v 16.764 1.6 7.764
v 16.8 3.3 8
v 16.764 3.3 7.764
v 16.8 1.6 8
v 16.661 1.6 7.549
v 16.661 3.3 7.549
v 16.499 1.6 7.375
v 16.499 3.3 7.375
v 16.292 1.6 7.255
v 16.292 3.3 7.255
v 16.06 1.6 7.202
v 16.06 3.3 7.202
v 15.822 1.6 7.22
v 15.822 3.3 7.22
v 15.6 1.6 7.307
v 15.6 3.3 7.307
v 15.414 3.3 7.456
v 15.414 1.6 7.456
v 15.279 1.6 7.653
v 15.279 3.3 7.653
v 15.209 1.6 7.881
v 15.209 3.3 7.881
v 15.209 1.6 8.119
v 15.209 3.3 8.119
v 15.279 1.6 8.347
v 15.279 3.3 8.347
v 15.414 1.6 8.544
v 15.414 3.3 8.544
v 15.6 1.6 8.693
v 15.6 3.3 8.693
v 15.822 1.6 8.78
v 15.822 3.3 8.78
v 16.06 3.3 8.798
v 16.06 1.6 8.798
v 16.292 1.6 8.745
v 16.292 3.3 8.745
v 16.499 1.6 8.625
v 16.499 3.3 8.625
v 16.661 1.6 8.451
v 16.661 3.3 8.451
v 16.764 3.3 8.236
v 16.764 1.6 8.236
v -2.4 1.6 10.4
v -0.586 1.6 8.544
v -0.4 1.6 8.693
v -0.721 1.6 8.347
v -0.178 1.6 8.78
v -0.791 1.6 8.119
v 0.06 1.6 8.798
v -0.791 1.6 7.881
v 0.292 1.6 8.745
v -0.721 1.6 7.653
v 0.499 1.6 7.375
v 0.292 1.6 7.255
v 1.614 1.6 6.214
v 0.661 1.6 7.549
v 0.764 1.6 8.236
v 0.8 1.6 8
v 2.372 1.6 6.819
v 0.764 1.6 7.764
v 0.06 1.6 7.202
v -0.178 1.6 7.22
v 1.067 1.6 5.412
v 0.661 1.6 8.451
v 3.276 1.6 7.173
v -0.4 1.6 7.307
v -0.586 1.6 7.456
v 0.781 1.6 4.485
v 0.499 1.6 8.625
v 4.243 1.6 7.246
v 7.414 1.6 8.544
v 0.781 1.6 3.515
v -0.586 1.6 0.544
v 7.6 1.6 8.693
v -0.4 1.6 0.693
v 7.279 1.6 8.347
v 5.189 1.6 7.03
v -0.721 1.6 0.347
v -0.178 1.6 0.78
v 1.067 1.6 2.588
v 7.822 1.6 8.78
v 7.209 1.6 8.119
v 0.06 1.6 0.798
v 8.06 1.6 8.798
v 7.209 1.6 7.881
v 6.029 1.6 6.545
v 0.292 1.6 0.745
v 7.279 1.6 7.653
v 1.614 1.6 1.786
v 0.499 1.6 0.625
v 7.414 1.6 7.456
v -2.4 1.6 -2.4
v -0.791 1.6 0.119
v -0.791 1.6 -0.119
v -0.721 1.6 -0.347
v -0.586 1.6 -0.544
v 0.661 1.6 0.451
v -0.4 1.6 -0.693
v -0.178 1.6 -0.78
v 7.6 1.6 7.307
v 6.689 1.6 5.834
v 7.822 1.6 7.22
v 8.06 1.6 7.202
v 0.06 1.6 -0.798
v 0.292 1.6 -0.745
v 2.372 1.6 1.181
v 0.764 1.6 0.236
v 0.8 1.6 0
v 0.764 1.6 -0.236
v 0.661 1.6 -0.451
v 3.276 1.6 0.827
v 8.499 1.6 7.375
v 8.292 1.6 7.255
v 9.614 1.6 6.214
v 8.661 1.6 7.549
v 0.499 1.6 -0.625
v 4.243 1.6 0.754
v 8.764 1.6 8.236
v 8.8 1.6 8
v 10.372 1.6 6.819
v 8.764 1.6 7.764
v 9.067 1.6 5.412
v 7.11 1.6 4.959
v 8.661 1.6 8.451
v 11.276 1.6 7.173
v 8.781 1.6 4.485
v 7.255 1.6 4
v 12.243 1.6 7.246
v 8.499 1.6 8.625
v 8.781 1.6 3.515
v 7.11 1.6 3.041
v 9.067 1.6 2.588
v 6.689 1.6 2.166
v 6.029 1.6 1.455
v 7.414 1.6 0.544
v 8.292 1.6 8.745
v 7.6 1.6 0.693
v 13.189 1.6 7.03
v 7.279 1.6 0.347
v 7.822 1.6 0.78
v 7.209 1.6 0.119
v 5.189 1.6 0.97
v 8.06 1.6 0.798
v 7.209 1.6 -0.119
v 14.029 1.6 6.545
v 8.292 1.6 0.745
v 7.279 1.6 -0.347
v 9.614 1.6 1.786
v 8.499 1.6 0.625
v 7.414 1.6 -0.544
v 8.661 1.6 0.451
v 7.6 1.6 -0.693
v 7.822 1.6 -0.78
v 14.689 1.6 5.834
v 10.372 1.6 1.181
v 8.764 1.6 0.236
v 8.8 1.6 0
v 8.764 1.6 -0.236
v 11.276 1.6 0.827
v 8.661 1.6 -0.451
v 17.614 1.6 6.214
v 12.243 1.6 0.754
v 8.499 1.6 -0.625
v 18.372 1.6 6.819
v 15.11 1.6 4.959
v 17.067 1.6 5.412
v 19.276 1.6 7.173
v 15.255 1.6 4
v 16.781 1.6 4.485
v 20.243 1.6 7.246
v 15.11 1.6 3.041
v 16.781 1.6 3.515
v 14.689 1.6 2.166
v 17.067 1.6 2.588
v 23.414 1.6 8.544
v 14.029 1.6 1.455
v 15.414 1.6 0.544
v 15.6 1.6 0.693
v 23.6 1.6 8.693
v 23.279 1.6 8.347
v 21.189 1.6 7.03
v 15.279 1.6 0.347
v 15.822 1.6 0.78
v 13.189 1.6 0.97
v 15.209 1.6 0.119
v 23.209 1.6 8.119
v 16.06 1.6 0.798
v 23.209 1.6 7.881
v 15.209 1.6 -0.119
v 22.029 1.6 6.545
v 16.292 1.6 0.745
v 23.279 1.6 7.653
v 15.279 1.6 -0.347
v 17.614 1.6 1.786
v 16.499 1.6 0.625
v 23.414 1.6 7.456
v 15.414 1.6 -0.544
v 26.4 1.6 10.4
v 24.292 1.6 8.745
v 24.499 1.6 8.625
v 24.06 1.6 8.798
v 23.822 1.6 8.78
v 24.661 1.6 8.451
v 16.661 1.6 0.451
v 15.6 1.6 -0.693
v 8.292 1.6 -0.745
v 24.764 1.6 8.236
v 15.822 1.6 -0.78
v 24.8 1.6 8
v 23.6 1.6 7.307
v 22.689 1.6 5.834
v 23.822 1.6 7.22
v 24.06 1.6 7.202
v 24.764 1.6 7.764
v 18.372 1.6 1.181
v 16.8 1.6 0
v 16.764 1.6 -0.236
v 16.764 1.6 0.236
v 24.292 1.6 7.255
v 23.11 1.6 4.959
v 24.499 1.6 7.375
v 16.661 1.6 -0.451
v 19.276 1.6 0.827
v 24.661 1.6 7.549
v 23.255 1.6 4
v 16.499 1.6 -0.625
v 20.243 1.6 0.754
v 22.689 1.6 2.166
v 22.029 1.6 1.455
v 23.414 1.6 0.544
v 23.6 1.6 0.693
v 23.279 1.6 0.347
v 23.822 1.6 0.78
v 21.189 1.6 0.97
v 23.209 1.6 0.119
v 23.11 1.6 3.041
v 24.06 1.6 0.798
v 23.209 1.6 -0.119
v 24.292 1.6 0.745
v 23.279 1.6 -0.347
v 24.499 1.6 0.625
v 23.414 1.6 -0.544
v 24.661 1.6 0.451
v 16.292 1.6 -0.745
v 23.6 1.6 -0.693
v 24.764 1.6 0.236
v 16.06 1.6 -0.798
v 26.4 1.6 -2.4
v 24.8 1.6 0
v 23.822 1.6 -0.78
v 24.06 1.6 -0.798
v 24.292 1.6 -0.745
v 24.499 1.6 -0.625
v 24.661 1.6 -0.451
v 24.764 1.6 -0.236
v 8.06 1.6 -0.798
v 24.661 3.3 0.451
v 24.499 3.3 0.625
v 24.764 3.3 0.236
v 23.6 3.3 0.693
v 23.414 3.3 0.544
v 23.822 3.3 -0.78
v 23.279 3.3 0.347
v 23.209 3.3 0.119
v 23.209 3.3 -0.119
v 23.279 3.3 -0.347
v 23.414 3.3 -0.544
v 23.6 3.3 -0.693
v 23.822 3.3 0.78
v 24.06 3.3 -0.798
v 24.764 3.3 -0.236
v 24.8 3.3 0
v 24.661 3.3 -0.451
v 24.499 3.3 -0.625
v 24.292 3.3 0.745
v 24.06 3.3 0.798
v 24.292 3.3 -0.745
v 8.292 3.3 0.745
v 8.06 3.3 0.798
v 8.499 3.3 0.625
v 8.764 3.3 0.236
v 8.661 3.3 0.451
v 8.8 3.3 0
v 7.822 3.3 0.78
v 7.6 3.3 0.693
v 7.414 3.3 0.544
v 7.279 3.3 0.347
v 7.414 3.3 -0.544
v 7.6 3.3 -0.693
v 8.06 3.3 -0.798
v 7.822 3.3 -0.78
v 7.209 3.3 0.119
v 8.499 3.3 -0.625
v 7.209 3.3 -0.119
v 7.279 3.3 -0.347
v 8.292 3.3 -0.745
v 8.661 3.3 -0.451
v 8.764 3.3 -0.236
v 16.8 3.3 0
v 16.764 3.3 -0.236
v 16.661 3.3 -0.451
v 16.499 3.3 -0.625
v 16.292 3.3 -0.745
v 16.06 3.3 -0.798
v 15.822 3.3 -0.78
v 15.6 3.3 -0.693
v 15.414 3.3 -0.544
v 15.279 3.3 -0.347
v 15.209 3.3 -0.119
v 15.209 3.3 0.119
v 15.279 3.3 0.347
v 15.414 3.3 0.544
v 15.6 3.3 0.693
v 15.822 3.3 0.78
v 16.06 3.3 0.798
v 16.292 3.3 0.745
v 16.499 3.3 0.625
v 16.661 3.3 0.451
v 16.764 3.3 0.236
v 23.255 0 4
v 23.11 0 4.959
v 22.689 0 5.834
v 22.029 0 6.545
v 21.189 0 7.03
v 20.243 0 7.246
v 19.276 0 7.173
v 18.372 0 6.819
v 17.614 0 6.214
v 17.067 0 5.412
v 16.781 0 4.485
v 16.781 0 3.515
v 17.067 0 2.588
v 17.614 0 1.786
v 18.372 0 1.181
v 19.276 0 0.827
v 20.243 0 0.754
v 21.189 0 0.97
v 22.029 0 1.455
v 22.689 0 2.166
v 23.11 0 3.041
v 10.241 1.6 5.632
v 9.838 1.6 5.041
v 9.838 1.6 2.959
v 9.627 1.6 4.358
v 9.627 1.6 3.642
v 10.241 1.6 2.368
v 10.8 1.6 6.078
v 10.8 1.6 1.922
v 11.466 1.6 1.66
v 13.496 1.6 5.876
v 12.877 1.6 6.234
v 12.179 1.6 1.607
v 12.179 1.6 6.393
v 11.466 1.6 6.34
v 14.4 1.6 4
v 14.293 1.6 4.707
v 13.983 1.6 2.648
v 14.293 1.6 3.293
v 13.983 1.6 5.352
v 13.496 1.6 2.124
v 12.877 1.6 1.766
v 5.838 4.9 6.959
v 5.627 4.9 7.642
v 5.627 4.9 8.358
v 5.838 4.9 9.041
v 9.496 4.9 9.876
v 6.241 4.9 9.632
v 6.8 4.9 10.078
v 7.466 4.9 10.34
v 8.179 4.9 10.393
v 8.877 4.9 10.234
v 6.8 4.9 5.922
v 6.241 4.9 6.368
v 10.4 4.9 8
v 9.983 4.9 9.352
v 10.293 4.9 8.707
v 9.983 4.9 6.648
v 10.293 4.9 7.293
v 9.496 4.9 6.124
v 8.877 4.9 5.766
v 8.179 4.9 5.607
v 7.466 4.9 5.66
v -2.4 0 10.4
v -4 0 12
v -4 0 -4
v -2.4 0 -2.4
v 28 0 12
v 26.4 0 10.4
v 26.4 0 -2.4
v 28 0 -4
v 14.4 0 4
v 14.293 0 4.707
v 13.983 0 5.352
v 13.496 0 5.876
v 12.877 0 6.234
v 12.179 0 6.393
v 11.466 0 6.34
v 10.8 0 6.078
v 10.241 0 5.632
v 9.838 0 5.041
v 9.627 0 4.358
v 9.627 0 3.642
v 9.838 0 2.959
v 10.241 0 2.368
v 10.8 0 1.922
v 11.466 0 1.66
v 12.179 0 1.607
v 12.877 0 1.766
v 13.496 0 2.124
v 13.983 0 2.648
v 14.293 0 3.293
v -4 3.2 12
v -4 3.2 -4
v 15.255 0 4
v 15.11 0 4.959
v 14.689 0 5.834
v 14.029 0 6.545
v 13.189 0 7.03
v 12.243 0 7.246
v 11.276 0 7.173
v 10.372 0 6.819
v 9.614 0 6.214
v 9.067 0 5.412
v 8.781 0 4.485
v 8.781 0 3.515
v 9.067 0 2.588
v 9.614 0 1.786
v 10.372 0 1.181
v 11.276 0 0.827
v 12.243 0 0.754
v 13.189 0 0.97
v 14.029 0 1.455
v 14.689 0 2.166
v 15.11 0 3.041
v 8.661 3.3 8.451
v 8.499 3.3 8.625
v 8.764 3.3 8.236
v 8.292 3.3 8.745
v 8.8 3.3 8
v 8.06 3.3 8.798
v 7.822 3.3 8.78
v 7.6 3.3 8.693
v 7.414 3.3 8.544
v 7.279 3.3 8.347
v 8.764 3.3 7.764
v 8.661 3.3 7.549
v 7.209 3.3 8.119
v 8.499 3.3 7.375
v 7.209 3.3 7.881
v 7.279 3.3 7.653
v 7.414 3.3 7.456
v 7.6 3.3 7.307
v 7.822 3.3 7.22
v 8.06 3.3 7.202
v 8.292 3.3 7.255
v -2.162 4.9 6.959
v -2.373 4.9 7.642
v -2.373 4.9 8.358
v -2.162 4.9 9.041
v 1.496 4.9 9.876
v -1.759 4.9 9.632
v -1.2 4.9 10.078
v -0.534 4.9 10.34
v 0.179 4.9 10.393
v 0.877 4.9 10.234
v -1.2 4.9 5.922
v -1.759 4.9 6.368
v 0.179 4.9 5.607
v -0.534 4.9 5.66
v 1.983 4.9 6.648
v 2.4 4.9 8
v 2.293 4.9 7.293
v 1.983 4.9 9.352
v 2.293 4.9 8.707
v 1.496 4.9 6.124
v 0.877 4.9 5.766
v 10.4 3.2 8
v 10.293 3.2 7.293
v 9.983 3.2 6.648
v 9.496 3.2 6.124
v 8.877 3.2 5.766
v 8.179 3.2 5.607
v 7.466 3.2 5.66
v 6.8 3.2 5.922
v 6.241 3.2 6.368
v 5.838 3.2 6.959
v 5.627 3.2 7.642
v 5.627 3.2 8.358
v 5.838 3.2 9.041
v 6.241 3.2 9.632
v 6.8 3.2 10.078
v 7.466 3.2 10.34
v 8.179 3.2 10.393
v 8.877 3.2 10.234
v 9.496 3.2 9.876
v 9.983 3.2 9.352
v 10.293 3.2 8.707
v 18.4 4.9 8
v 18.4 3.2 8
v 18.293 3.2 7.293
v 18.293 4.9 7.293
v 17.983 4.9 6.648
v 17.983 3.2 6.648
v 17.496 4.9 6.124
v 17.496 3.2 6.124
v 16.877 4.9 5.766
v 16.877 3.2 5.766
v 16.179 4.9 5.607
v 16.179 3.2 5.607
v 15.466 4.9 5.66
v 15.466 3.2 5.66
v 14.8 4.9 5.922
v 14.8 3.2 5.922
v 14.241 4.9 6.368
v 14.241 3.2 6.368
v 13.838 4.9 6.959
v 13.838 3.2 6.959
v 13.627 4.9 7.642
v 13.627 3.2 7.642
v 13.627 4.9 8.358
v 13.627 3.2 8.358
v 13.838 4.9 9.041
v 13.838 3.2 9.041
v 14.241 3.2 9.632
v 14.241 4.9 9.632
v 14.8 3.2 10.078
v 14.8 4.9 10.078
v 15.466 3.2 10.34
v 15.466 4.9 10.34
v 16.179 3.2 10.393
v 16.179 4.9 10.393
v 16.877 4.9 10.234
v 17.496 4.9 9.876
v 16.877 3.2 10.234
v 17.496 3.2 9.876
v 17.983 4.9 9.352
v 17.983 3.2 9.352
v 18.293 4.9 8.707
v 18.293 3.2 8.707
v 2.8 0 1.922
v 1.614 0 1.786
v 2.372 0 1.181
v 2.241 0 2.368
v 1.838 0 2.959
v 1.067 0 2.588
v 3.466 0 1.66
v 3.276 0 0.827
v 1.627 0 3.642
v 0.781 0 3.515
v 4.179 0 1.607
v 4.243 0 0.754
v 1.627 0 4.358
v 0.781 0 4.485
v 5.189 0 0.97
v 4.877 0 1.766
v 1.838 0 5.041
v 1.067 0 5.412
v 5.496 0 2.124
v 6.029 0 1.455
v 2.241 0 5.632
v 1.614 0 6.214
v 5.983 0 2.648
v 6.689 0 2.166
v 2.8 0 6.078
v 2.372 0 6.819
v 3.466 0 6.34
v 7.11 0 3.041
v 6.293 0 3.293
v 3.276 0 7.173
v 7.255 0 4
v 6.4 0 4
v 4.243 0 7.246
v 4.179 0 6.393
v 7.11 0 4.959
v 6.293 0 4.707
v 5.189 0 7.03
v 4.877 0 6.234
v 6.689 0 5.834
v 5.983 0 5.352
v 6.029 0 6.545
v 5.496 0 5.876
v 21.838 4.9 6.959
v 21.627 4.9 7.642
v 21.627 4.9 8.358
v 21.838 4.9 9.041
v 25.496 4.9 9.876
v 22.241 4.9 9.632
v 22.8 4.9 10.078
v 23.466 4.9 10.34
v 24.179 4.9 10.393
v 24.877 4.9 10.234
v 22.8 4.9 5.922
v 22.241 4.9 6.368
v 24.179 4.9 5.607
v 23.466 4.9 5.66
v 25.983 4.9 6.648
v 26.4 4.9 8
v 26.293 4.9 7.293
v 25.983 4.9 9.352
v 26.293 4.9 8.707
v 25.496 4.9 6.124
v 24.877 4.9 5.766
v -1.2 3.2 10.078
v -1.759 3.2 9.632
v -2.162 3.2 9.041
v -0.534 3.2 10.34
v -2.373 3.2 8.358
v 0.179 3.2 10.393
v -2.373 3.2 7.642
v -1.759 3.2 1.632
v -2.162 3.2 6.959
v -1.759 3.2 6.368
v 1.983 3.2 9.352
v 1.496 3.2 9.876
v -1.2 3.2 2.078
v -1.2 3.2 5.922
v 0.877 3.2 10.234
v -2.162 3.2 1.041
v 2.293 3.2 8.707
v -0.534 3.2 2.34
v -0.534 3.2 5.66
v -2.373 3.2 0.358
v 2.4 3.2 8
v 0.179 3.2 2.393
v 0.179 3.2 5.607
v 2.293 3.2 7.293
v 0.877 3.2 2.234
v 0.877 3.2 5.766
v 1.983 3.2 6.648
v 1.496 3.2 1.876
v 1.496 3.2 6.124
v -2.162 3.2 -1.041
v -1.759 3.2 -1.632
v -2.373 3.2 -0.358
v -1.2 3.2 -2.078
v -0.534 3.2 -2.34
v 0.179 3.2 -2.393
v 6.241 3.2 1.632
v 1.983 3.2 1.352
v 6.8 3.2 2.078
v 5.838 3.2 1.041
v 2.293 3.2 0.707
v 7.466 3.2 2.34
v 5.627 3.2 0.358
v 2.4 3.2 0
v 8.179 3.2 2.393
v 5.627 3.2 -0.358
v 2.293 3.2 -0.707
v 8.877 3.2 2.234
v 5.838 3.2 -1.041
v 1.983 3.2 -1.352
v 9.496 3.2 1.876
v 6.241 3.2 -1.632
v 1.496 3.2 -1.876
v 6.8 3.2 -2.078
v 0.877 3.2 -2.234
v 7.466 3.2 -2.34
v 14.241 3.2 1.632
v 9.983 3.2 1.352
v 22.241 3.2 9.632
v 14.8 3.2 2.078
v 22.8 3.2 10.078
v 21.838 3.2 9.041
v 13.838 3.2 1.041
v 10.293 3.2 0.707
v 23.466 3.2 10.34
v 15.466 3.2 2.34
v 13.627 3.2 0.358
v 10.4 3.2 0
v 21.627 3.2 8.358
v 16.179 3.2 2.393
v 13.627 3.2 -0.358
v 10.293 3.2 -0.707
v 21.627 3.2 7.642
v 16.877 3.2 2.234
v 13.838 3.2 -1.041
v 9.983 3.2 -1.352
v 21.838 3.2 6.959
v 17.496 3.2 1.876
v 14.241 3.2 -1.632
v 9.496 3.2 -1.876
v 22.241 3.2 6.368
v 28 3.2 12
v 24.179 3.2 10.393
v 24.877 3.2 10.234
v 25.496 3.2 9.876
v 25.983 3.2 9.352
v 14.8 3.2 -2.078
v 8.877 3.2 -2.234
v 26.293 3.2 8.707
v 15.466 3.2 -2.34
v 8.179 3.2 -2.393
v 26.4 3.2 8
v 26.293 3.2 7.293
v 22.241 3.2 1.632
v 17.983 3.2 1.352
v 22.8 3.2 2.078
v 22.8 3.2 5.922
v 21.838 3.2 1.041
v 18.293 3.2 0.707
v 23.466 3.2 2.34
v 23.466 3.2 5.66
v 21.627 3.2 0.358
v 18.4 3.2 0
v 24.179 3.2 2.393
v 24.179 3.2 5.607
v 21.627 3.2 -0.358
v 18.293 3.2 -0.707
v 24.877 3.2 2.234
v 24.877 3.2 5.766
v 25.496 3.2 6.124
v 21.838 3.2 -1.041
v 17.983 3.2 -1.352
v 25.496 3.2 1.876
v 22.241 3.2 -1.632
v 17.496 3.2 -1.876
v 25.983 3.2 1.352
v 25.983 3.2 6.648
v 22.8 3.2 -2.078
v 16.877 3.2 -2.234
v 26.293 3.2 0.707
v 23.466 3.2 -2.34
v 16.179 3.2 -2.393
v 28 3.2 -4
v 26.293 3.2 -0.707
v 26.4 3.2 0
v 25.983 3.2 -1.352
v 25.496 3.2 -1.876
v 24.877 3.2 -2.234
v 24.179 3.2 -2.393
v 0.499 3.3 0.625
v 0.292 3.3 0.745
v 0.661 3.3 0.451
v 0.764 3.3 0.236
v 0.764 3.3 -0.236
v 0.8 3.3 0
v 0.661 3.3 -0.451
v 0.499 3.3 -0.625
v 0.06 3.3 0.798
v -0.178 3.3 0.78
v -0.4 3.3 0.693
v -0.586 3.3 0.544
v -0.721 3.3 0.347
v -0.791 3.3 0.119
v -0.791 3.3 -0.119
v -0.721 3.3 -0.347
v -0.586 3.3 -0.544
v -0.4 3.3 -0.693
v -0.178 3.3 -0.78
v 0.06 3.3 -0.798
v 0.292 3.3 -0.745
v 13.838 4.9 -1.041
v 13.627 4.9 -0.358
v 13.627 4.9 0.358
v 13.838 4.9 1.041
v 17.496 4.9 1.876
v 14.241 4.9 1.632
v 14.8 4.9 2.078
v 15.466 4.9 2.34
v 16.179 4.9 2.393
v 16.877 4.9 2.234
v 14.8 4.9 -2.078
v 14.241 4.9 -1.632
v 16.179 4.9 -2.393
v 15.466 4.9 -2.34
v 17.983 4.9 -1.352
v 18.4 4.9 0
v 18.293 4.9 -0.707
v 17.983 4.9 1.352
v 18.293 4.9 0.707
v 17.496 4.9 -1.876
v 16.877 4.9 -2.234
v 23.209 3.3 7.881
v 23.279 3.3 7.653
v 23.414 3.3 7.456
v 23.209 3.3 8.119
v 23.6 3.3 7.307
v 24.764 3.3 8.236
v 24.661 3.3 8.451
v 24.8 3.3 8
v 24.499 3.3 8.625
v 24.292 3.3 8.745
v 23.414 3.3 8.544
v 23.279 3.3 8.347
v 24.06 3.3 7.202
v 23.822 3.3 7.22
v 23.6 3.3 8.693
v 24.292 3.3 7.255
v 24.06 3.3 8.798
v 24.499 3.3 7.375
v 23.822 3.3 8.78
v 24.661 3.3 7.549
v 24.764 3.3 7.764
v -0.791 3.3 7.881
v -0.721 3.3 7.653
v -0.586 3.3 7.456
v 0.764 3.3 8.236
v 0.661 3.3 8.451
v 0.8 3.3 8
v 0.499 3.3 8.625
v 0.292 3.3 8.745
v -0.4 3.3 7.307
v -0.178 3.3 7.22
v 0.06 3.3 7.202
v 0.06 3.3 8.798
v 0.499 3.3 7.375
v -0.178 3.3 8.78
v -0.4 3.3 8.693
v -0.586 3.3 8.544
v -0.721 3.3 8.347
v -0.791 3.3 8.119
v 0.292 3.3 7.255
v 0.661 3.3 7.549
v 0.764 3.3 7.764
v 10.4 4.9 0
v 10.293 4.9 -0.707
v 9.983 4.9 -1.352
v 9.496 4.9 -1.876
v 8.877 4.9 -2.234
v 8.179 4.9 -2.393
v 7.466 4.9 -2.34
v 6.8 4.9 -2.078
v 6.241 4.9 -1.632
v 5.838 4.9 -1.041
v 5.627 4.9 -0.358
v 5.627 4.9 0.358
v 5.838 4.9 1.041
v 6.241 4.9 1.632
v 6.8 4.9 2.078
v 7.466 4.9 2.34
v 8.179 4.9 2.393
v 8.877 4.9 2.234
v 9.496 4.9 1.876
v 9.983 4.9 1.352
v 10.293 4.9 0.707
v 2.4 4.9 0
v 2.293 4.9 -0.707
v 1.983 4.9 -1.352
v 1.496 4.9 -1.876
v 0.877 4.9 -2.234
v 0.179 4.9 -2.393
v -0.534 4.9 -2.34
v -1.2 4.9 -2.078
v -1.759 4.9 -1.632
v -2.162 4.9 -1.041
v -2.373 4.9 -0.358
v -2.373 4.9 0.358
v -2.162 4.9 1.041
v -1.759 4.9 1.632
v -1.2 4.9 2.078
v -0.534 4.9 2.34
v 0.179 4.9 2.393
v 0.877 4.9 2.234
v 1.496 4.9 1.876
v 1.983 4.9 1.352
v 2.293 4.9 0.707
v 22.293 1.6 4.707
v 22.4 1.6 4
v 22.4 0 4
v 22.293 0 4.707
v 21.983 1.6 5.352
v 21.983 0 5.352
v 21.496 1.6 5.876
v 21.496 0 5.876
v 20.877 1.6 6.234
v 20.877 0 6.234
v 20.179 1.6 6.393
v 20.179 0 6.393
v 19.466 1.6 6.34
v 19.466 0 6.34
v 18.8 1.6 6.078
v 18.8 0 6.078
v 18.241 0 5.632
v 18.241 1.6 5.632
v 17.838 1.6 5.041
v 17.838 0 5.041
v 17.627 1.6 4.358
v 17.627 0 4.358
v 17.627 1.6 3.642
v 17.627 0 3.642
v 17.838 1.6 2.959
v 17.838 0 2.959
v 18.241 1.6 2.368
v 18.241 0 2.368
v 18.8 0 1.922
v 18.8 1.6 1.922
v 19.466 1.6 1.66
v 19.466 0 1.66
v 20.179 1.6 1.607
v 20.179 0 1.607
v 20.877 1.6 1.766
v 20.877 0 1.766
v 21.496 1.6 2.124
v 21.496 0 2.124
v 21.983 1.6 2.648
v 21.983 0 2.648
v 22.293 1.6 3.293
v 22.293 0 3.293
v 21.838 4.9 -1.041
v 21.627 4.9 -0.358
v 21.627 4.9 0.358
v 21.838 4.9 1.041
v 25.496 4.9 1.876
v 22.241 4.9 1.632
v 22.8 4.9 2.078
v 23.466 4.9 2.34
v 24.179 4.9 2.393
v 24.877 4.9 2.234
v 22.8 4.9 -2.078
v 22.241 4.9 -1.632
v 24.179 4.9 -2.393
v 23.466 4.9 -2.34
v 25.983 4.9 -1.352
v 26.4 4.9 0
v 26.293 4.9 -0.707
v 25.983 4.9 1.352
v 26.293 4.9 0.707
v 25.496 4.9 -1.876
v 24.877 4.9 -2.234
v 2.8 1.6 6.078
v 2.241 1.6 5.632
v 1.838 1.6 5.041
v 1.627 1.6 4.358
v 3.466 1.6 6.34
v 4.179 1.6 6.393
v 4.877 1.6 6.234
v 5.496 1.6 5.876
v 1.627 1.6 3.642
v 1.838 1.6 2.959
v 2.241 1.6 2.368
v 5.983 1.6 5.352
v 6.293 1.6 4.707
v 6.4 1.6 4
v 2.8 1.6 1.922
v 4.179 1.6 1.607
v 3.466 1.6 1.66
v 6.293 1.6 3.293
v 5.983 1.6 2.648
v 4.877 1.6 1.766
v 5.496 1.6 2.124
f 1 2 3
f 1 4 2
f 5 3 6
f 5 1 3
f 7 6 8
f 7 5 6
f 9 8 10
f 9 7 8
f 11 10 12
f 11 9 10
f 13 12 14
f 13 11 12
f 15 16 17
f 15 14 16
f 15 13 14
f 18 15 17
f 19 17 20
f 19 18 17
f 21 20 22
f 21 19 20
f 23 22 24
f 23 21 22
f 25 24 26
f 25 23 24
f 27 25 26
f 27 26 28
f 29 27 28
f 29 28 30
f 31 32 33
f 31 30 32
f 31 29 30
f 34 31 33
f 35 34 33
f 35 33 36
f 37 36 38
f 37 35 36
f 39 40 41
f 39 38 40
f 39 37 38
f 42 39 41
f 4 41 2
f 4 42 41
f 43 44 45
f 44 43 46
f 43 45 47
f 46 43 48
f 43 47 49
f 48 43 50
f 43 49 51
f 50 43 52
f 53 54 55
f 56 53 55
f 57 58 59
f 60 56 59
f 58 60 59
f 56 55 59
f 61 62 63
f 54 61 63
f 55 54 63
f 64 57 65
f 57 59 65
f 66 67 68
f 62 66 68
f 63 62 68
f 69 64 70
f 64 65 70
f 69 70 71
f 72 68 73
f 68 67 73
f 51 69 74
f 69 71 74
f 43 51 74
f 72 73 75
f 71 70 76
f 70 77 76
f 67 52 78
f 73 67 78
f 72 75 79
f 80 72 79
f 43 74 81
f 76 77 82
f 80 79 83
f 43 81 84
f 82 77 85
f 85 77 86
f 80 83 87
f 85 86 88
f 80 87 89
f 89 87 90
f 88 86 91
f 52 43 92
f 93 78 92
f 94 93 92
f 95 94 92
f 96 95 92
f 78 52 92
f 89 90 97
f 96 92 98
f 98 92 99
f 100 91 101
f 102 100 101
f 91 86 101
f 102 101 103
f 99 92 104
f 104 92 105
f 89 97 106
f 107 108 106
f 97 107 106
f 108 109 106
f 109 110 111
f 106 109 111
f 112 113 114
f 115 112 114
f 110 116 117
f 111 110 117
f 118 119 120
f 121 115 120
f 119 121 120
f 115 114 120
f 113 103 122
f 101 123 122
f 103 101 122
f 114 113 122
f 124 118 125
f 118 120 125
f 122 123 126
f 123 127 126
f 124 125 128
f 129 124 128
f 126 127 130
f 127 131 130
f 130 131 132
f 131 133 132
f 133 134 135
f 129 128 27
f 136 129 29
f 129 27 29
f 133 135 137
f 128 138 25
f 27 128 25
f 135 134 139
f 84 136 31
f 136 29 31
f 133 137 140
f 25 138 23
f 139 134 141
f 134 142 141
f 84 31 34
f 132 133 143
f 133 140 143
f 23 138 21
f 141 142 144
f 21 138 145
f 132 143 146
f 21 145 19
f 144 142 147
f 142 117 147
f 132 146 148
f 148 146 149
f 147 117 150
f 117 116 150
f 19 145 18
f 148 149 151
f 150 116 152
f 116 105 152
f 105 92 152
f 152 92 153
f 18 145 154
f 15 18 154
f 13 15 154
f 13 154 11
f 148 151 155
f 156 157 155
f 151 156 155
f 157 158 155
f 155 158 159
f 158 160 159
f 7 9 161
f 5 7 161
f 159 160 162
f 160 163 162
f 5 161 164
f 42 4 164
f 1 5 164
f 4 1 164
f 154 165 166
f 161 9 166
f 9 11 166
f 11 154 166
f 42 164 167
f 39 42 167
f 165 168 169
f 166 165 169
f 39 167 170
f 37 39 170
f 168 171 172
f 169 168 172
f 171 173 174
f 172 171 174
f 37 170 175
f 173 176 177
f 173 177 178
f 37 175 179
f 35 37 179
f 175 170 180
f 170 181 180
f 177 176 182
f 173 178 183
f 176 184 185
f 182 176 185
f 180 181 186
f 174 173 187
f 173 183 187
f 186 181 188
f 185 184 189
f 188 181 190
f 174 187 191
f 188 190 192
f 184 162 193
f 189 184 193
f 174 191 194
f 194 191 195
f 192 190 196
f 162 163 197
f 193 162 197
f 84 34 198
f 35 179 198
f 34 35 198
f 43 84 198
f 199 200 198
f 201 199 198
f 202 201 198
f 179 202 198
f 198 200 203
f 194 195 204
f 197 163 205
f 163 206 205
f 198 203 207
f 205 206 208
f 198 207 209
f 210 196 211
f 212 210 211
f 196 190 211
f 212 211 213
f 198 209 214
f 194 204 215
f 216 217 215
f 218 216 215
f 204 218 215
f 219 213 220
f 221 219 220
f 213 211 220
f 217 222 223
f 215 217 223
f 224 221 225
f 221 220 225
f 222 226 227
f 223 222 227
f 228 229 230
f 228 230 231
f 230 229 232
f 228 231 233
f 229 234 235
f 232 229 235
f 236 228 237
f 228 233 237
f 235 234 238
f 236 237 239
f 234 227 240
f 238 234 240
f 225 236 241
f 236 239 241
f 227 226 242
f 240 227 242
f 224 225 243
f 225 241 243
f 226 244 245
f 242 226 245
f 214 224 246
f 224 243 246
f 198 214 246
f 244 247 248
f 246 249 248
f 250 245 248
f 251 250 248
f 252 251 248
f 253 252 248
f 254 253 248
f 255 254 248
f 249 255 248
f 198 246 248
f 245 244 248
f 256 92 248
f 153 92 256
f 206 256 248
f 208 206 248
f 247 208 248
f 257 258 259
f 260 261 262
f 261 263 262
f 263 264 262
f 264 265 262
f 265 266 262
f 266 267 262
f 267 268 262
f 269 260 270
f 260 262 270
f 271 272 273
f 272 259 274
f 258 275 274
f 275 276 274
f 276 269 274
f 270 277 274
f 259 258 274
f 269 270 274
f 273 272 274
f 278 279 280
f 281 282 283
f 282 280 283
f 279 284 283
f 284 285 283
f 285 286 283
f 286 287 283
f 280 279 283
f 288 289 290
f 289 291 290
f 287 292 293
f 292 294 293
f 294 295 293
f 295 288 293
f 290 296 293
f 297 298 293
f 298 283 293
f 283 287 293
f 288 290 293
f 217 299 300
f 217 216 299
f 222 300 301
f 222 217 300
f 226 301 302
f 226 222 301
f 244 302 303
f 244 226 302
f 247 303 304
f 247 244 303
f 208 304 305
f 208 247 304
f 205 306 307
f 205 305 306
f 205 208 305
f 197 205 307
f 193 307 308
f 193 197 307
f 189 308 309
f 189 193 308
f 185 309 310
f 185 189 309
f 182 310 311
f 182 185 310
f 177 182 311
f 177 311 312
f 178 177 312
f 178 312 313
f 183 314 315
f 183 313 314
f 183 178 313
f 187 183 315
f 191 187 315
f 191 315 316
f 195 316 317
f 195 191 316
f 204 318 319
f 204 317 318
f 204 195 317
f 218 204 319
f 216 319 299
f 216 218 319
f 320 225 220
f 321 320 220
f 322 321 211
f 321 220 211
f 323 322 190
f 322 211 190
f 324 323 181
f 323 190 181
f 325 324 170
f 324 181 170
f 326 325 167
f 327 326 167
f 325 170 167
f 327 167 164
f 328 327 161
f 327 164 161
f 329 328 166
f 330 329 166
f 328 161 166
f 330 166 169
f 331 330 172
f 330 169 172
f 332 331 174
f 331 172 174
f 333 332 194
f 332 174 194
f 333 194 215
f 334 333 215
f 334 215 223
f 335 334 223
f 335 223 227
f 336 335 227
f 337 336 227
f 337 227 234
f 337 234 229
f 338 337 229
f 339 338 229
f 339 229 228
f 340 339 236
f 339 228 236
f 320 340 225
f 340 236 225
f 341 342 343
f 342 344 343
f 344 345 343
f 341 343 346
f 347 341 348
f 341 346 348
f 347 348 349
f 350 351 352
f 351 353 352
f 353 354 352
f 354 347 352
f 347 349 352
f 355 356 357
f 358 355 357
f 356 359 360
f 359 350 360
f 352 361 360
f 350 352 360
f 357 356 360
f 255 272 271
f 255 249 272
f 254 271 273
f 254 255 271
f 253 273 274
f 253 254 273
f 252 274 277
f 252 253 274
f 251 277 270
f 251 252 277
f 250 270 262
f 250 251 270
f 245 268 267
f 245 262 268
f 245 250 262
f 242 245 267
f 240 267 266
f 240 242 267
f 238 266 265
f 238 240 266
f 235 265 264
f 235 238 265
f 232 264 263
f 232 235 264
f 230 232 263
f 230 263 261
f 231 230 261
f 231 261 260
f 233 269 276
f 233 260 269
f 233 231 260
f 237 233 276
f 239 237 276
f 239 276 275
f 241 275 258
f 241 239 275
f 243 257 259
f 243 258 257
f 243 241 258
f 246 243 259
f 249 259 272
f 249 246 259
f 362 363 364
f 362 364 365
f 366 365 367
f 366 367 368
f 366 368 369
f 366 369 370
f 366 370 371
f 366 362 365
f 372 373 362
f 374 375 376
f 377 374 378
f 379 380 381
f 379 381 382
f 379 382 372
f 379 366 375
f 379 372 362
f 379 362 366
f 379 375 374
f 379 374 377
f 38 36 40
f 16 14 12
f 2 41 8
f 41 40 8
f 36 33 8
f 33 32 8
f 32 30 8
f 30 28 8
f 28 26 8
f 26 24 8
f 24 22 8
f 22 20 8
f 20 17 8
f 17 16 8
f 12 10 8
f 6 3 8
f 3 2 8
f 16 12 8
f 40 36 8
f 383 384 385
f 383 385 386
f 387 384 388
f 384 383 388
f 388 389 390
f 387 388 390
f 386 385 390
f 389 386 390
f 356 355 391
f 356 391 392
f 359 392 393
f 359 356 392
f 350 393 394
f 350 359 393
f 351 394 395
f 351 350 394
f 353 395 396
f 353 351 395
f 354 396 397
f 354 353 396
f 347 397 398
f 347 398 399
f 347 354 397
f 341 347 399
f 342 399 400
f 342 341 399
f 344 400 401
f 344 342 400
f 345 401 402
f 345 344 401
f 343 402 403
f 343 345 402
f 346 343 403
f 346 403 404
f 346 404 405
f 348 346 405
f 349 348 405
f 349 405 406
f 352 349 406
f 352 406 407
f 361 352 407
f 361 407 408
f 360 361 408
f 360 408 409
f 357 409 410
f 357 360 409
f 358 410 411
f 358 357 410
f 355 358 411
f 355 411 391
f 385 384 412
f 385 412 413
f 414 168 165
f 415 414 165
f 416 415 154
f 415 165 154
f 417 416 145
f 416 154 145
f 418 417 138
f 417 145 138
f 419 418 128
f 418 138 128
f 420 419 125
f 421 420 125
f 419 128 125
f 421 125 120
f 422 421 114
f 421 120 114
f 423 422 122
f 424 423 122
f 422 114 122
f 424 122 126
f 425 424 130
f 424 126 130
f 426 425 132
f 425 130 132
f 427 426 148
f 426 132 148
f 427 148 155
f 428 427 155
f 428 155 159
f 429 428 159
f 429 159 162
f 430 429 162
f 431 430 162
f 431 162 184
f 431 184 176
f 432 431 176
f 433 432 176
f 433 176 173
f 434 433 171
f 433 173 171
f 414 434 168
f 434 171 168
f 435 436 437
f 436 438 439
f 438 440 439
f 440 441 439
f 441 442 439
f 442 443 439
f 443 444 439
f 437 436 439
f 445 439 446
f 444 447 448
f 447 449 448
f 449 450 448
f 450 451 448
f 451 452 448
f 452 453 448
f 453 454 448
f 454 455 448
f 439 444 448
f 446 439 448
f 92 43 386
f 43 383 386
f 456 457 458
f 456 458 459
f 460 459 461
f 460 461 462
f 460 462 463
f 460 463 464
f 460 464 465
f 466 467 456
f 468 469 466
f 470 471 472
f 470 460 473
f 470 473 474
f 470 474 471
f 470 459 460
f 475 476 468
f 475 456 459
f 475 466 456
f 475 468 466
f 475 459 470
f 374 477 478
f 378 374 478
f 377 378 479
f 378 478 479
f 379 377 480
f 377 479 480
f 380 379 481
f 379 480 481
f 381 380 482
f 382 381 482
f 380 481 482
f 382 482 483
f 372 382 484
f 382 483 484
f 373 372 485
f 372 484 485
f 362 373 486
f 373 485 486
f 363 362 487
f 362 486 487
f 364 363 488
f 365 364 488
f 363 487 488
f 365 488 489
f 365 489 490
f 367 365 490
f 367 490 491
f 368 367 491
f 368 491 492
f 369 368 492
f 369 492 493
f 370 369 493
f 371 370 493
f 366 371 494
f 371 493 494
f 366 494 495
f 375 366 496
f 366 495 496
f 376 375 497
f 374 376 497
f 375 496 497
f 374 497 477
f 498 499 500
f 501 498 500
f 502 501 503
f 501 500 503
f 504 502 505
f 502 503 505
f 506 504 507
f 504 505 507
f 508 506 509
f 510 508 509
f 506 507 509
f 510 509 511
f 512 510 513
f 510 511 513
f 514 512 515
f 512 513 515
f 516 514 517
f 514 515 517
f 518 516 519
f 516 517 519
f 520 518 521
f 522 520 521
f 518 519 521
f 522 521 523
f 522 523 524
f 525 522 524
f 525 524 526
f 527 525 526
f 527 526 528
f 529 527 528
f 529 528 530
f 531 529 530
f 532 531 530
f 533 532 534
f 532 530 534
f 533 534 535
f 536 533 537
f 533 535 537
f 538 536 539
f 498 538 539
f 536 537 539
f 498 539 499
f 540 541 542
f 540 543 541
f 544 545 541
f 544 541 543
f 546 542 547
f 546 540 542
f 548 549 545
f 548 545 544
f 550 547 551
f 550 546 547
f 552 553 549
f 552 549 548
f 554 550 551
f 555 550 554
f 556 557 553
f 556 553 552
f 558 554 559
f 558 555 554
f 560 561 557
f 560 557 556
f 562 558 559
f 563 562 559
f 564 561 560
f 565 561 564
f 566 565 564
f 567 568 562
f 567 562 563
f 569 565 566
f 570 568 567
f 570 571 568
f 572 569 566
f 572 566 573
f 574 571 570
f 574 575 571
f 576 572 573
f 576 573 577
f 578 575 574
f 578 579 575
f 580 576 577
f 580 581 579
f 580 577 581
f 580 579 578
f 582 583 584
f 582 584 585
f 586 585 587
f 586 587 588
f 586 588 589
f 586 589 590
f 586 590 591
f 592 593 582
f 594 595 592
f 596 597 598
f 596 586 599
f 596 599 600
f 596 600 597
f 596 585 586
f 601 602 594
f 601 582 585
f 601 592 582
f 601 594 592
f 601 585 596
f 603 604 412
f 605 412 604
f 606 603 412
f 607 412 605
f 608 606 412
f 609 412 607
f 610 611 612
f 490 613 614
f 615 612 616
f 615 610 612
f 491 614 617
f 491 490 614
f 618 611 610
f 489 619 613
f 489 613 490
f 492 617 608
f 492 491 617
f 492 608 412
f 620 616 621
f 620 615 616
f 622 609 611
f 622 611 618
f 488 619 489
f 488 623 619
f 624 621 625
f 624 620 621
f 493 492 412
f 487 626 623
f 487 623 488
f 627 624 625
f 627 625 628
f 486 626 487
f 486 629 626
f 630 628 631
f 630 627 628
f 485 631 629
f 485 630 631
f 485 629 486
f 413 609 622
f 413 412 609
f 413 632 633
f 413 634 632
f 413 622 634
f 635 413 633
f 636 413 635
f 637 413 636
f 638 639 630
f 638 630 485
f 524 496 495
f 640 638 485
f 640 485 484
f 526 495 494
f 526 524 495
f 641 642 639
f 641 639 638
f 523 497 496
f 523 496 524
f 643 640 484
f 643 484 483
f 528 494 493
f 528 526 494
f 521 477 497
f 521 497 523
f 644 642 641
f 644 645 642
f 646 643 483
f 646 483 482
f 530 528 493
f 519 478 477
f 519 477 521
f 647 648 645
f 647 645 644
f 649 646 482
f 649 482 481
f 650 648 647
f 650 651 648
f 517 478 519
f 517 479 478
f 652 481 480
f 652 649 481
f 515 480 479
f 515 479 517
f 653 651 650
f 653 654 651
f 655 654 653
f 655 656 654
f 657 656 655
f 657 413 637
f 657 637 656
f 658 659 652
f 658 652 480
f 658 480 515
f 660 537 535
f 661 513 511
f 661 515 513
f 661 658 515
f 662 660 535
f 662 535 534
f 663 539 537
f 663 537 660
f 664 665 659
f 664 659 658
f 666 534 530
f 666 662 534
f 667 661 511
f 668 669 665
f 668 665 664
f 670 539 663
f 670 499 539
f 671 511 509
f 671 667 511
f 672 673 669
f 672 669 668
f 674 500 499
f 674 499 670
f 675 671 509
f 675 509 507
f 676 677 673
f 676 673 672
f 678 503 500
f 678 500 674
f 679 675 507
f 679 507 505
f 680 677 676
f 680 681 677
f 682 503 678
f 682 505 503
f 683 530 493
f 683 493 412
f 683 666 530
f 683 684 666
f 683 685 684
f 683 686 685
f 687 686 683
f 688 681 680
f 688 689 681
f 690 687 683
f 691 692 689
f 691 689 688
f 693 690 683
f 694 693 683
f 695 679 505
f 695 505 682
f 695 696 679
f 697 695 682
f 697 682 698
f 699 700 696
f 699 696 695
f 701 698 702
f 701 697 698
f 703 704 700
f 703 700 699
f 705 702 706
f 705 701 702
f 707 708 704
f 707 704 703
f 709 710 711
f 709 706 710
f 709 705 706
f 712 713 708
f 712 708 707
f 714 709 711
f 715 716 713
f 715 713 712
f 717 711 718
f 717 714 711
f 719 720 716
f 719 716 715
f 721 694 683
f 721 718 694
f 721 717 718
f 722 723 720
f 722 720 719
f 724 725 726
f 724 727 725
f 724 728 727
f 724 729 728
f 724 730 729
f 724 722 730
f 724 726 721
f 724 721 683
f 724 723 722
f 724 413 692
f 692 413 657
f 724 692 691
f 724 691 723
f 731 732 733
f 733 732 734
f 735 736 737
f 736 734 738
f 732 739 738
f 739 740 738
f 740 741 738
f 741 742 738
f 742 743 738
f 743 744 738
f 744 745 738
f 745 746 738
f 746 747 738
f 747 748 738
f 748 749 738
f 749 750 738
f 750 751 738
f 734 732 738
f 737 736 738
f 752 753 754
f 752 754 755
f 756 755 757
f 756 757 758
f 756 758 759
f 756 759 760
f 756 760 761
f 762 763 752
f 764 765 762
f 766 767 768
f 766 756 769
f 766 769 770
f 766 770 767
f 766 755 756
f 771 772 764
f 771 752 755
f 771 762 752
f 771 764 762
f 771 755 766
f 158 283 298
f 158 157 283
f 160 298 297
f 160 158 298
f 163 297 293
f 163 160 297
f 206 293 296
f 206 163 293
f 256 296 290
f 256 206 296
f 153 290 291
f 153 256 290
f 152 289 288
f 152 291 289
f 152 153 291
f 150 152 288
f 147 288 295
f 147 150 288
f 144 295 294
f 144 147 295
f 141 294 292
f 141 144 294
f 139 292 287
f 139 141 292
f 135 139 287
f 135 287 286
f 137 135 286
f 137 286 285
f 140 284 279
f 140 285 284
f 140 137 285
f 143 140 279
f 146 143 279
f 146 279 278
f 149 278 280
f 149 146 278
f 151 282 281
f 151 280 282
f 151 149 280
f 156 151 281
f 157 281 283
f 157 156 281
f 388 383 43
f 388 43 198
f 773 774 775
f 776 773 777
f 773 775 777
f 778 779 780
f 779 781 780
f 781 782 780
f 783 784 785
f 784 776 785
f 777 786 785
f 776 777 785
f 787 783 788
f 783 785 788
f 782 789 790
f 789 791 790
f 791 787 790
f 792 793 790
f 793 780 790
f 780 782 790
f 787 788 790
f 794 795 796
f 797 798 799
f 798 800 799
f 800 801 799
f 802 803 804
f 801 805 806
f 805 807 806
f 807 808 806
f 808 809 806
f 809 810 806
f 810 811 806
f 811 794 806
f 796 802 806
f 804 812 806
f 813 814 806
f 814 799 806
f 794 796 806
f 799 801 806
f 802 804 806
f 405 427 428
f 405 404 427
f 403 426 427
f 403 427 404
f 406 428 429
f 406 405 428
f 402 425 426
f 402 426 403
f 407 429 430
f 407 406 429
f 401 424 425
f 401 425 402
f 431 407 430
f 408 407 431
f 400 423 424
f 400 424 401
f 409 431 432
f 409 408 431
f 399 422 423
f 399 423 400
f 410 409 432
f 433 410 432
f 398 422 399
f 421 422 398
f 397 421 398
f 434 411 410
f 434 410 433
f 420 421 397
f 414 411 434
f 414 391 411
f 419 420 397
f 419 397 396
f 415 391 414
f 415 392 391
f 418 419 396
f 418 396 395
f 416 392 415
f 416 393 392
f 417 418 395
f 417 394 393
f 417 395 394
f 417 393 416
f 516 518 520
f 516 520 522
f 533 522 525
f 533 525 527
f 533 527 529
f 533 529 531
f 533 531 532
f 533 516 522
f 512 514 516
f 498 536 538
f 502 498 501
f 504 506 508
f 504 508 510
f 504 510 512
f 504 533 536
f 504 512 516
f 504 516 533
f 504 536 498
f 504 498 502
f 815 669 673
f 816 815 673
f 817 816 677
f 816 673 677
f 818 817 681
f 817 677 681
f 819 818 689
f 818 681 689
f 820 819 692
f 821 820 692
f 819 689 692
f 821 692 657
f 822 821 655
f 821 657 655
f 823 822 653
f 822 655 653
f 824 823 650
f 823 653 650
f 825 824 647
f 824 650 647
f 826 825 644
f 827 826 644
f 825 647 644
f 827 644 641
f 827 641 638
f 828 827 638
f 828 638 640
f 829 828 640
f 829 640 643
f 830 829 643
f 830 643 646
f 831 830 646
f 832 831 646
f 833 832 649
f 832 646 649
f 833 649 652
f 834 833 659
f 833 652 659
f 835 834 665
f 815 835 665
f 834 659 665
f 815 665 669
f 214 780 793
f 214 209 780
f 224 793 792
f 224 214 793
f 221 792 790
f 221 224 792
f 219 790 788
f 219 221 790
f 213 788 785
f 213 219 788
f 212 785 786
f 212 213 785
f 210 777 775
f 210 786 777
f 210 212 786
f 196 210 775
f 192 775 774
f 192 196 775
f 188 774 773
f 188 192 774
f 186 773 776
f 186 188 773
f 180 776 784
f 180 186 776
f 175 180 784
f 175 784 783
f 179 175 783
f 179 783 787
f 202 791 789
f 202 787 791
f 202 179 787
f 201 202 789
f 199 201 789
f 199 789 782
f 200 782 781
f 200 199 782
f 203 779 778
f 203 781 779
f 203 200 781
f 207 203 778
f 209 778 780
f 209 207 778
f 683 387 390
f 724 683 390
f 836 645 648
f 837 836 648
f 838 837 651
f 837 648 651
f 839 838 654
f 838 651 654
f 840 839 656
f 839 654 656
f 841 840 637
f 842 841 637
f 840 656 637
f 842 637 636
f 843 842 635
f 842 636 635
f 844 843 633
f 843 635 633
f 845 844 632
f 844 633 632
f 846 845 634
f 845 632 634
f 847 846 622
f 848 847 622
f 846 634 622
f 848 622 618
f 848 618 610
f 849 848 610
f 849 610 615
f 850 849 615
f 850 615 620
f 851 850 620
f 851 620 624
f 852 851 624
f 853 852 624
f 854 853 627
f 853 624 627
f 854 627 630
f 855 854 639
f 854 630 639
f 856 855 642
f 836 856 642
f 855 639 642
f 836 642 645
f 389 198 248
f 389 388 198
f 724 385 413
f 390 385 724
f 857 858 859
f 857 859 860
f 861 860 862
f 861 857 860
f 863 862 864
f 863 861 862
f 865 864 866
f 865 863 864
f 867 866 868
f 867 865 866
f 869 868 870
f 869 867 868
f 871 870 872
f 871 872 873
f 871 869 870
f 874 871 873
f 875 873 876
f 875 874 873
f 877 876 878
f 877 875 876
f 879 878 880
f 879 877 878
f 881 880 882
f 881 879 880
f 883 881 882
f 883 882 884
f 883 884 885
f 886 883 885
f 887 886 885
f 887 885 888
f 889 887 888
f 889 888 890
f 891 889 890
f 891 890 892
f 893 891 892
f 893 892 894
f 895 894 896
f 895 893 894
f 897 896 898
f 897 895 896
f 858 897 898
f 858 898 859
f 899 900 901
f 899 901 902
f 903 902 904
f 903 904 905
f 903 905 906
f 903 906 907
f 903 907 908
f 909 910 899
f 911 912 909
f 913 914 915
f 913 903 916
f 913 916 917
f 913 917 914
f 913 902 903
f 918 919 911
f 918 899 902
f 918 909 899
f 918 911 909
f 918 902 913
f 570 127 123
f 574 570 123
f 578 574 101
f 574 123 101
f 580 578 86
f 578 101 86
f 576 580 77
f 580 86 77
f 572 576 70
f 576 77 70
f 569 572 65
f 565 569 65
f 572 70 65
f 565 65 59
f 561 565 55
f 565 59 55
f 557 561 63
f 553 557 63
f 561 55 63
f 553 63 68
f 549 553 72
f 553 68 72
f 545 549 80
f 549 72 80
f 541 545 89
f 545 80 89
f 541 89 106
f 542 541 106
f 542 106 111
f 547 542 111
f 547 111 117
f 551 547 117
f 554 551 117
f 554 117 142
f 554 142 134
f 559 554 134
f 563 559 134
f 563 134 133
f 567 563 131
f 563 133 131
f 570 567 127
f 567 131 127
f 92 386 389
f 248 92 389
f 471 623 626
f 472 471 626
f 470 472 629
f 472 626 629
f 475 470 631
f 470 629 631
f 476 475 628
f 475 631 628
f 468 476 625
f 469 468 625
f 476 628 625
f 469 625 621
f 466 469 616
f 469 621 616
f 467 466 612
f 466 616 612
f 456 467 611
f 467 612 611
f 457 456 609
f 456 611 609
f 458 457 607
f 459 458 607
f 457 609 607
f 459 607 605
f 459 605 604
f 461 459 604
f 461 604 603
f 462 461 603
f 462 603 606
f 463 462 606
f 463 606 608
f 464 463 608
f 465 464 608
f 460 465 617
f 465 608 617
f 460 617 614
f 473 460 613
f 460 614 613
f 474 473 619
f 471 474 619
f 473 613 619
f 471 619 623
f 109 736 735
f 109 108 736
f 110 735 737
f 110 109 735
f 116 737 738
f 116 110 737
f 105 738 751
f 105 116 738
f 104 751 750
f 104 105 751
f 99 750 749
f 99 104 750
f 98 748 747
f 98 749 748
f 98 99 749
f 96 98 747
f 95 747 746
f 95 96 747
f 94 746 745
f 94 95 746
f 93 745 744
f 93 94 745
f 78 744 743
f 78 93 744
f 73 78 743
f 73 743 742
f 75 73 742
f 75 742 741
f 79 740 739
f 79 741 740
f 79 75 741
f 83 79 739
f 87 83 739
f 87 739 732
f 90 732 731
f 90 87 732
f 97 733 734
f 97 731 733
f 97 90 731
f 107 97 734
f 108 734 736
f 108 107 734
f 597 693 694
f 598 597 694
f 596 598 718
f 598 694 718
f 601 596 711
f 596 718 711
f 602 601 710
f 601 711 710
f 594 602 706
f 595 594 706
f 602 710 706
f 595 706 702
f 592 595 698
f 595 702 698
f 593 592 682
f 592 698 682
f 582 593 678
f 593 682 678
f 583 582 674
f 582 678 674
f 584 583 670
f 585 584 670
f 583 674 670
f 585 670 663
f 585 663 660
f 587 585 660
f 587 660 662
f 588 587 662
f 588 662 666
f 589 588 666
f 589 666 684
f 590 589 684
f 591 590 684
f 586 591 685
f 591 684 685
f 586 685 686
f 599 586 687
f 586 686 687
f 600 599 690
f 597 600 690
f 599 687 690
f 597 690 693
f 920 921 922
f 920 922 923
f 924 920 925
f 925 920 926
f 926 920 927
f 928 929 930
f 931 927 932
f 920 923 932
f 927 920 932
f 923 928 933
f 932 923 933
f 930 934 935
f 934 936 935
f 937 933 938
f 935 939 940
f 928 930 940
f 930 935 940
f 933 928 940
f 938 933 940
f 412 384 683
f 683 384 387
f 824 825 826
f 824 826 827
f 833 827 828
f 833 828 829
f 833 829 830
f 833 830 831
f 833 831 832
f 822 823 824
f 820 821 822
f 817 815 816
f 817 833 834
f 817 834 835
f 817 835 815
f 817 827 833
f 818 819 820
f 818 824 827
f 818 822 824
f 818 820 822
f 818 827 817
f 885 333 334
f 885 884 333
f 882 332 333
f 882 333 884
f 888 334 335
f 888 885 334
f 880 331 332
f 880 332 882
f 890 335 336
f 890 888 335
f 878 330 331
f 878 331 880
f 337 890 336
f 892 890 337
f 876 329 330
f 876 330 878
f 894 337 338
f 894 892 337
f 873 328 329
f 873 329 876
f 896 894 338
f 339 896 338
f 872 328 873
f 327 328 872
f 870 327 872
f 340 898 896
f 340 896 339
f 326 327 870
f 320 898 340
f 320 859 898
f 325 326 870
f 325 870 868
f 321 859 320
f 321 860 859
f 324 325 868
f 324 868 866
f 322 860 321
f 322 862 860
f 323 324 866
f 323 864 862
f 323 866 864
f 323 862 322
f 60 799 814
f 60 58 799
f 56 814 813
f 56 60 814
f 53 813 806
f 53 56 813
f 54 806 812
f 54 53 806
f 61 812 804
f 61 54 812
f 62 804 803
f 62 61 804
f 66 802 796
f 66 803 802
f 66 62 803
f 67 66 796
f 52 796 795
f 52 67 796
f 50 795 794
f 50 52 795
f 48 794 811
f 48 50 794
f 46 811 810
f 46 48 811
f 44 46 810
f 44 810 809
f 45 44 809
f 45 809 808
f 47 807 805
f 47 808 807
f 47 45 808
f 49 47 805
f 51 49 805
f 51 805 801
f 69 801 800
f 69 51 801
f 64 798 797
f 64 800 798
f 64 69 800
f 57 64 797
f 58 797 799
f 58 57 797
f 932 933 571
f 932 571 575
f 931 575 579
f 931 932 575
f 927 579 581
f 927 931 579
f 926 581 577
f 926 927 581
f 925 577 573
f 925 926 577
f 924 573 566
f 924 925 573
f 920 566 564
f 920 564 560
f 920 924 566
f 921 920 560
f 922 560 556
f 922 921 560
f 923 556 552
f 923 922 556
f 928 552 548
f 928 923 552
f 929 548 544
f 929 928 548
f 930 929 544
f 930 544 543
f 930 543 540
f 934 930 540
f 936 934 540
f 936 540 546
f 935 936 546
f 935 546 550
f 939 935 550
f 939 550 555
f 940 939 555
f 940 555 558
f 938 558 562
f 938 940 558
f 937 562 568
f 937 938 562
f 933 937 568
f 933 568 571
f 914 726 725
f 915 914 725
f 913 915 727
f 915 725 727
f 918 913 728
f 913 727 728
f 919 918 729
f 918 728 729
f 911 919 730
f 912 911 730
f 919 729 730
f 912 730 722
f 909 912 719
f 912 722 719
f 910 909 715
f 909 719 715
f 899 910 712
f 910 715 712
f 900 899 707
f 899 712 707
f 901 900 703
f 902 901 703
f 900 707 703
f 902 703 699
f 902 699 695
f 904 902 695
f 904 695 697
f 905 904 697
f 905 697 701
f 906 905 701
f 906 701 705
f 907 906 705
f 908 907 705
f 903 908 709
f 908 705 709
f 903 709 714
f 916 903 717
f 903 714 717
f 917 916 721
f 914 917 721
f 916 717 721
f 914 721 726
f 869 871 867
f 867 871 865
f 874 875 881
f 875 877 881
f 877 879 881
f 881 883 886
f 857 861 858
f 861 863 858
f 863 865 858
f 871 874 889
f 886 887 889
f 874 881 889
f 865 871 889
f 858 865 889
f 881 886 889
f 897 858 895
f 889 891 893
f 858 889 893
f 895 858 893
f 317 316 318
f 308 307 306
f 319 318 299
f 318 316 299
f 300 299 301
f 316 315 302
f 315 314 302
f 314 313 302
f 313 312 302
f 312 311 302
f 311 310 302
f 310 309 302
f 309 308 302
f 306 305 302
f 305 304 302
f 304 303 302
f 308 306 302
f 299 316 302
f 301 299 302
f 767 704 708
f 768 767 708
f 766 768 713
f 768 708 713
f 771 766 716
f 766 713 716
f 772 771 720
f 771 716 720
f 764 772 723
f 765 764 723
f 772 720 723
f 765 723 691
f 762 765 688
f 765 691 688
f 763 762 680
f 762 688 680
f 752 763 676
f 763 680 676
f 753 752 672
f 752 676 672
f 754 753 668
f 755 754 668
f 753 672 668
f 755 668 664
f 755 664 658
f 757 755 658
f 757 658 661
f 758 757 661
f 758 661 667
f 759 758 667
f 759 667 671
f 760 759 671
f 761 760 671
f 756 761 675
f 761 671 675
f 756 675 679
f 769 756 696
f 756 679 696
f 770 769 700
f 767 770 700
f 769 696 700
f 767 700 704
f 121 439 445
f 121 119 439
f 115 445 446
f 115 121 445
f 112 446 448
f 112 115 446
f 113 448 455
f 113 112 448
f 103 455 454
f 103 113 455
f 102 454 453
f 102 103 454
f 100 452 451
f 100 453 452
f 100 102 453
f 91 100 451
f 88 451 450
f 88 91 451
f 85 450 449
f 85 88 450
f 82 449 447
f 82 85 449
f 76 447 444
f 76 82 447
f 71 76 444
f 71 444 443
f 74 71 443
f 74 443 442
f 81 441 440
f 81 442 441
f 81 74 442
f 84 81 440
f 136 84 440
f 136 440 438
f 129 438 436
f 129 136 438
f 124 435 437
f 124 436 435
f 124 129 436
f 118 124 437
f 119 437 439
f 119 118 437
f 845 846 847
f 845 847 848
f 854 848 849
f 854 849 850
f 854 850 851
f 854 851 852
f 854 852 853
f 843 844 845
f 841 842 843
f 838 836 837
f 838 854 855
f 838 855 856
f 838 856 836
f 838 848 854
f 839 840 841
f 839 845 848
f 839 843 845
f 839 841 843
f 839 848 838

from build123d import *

# Parameters (mm, degrees)
SKETCH_1_W                       = 8
SKETCH_1_H                       = 8
HEIGHT_DEPTH                     = 3.2
SKETCH_2_R                       = 2.4
EXTRUDE_2_DEPTH                  = 1.7
PATTERN_LINEAR_1_COUNT           = 2
PATTERN_LINEAR_1_PITCH           = 8
PATTERN_LINEAR_2_COUNT           = 4
PATTERN_LINEAR_2_PITCH           = 8
PATTERN_LINEAR_2_COPY_1_SKETCH_W = 8
PATTERN_LINEAR_2_COPY_1_SKETCH_H = 8
PATTERN_LINEAR_2_COPY_1_DEPTH    = 3.2
PATTERN_LINEAR_2_COPY_2_SKETCH_W = 8
PATTERN_LINEAR_2_COPY_2_SKETCH_H = 8
PATTERN_LINEAR_2_COPY_2_DEPTH    = 3.2
PATTERN_LINEAR_2_COPY_3_SKETCH_W = 8
PATTERN_LINEAR_2_COPY_3_SKETCH_H = 8
PATTERN_LINEAR_2_COPY_3_DEPTH    = 3.2
PATTERN_LINEAR_2_COPY_4_SKETCH_R = 2.4
PATTERN_LINEAR_2_COPY_4_DEPTH    = 1.7
PATTERN_LINEAR_2_COPY_5_SKETCH_R = 2.4
PATTERN_LINEAR_2_COPY_5_DEPTH    = 1.7
PATTERN_LINEAR_2_COPY_6_SKETCH_R = 2.4
PATTERN_LINEAR_2_COPY_6_DEPTH    = 1.7
SHELL_1_T                        = -1.6
SKETCH_3_R                       = 3.255
SKETCH_3_R_2                     = 2.4
EXTRUDE_3_DEPTH                  = 1.6
PATTERN_LINEAR_3_COUNT           = 3
PATTERN_LINEAR_3_PITCH           = 8


with BuildPart() as part:
    # 草圖1 → height (new body)
    with BuildSketch(Plane(origin=(0, 0, 0), x_dir=(1, 0, 0), z_dir=(0, 1, 0))):
        Rectangle(SKETCH_1_W, SKETCH_1_H)
    height = extrude(amount=HEIGHT_DEPTH)

    # 草圖2 → 填料-伸長2 (add)
    with BuildSketch(Plane(origin=(0, 3.2, 0), x_dir=(1, 0, 0), z_dir=(0, 1, 0))):
        Circle(SKETCH_2_R)
    extrude_2 = extrude(amount=EXTRUDE_2_DEPTH)

    # 直線複製排列1: height, 填料-伸長2 ×2
    with Locations(*[(0, 0, i * PATTERN_LINEAR_1_PITCH) for i in range(1, PATTERN_LINEAR_1_COUNT)]):
        add(height)
        add(extrude_2)

    # 直線複製排列2: height, 填料-伸長2 ×4
    with Locations(*[(i * PATTERN_LINEAR_2_PITCH, 0, 0) for i in range(1, PATTERN_LINEAR_2_COUNT)]):
        add(height)
        add(extrude_2)

    # 直線複製排列2 copy 1 sketch → 直線複製排列2 copy 1 (add)
    with BuildSketch(Plane(origin=(8, 0, 8), x_dir=(1, 0, 0), z_dir=(0, 1, 0))):
        Rectangle(PATTERN_LINEAR_2_COPY_1_SKETCH_W, PATTERN_LINEAR_2_COPY_1_SKETCH_H)
    extrude(amount=PATTERN_LINEAR_2_COPY_1_DEPTH)

    # 直線複製排列2 copy 2 sketch → 直線複製排列2 copy 2 (add)
    with BuildSketch(Plane(origin=(16, 0, 8), x_dir=(1, 0, 0), z_dir=(0, 1, 0))):
        Rectangle(PATTERN_LINEAR_2_COPY_2_SKETCH_W, PATTERN_LINEAR_2_COPY_2_SKETCH_H)
    extrude(amount=PATTERN_LINEAR_2_COPY_2_DEPTH)

    # 直線複製排列2 copy 3 sketch → 直線複製排列2 copy 3 (add)
    with BuildSketch(Plane(origin=(24, 0, 8), x_dir=(1, 0, 0), z_dir=(0, 1, 0))):
        Rectangle(PATTERN_LINEAR_2_COPY_3_SKETCH_W, PATTERN_LINEAR_2_COPY_3_SKETCH_H)
    extrude(amount=PATTERN_LINEAR_2_COPY_3_DEPTH)

    # 直線複製排列2 copy 4 sketch → 直線複製排列2 copy 4 (add)
    with BuildSketch(Plane(origin=(8, 3.2, 8), x_dir=(1, 0, 0), z_dir=(0, 1, 0))):
        Circle(PATTERN_LINEAR_2_COPY_4_SKETCH_R)
    extrude(amount=PATTERN_LINEAR_2_COPY_4_DEPTH)

    # 直線複製排列2 copy 5 sketch → 直線複製排列2 copy 5 (add)
    with BuildSketch(Plane(origin=(16, 3.2, 8), x_dir=(1, 0, 0), z_dir=(0, 1, 0))):
        Circle(PATTERN_LINEAR_2_COPY_5_SKETCH_R)
    extrude(amount=PATTERN_LINEAR_2_COPY_5_DEPTH)

    # 直線複製排列2 copy 6 sketch → 直線複製排列2 copy 6 (add)
    with BuildSketch(Plane(origin=(24, 3.2, 8), x_dir=(1, 0, 0), z_dir=(0, 1, 0))):
        Circle(PATTERN_LINEAR_2_COPY_6_SKETCH_R)
    extrude(amount=PATTERN_LINEAR_2_COPY_6_DEPTH)

    # 薄殼1
    shell_1_openings = [part.faces().sort_by_distance(p)[0] for p in [
        (12, 0, 4),
    ]]
    offset(amount=SHELL_1_T, openings=shell_1_openings, kind=Kind.INTERSECTION)

    # 草圖3 → 填料-伸長3 (add)
    with BuildSketch(Plane.XZ.offset(-1.6)):
        with Locations((4, 4)):
            Circle(SKETCH_3_R)
        with Locations((4, 4)):
            Circle(SKETCH_3_R_2, mode=Mode.SUBTRACT)
    extrude_3 = extrude(amount=EXTRUDE_3_DEPTH)

    # 直線複製排列3: 填料-伸長3 ×3
    with Locations(*[(i * PATTERN_LINEAR_3_PITCH, 0, 0) for i in range(1, PATTERN_LINEAR_3_COUNT)]):
        add(extrude_3)


solid = part.part
